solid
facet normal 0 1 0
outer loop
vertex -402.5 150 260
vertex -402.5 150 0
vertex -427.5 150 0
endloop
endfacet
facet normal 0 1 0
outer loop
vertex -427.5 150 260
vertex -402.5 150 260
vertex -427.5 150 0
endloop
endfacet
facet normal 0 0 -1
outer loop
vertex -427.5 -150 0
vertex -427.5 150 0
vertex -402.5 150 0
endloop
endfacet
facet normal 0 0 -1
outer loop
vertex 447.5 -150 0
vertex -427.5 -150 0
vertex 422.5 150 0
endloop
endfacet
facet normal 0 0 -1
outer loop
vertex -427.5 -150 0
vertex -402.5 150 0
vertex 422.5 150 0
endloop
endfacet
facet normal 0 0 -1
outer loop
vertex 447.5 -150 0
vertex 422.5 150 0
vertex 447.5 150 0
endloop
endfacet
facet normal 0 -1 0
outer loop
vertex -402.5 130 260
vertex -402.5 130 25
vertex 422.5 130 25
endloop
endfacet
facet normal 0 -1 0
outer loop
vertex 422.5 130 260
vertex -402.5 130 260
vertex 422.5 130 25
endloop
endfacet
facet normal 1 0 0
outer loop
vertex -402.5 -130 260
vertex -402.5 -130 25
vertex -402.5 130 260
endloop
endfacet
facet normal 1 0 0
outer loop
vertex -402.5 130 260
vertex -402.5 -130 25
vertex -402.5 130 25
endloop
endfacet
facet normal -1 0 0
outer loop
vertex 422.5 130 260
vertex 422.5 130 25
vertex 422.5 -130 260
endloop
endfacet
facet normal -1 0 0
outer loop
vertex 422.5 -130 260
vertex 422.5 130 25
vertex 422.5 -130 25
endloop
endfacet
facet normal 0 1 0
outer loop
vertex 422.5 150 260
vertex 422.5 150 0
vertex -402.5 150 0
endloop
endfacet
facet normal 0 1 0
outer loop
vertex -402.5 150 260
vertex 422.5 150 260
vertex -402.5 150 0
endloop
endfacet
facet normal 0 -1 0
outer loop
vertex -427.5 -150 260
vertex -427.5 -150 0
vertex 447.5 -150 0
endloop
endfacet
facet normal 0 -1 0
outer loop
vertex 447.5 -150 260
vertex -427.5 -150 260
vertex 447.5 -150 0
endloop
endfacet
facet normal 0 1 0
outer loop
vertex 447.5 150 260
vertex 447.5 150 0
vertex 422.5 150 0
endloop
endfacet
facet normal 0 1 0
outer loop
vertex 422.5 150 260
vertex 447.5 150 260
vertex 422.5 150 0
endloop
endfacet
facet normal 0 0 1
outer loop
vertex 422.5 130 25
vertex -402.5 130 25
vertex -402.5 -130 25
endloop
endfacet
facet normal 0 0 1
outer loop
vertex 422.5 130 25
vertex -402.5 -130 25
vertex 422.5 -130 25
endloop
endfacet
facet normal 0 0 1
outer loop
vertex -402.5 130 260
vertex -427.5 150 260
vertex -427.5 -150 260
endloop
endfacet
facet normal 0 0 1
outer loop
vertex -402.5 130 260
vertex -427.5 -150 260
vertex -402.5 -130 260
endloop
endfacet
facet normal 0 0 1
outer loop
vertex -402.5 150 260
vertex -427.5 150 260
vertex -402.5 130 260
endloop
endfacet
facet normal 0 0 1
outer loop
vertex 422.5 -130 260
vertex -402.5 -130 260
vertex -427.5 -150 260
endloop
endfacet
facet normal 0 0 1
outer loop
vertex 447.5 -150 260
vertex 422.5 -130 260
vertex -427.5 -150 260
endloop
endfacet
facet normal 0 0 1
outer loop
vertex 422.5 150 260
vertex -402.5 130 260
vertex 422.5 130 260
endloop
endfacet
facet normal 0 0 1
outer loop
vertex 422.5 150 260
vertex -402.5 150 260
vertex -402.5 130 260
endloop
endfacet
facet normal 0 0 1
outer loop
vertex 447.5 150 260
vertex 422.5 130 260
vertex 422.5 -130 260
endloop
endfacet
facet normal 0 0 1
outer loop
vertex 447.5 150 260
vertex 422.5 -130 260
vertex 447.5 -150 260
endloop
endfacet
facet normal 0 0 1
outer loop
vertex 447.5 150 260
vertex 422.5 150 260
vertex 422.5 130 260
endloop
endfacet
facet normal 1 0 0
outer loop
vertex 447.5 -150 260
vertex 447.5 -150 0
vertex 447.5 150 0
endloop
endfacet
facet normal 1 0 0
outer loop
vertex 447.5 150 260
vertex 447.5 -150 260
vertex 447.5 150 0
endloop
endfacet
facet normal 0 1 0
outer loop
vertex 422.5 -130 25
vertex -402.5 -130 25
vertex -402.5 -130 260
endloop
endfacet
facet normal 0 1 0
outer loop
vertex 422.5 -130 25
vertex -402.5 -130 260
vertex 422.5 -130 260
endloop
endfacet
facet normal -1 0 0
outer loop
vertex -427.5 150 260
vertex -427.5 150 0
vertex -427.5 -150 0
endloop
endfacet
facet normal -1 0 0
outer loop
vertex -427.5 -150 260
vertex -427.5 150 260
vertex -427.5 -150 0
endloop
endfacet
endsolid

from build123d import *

# Parameters (mm, degrees)
F0_W     = 825
F0_H     = 20
F1_DEPTH = 260
F0_H_2   = 260
F2_DEPTH = 25


# Not quite as in the source:
# - ends of sketch curves that miss each other by under 0.0002 mm in the source are joined
# - a feature names something its author has since deleted; it is built from what else it names


with BuildPart() as f1:
    # F0 (on Top) → F1 (new body)
    with BuildSketch(Plane.XY):
        Polygon((422.5, 130), (422.5, 149.9999940395), (-402.5, 150), (-402.5, 130), align=None)
        Polygon((422.5, -150), (447.5, -150), (447.5, 150), (422.5, 150), (422.5, 130), (422.5, -130), align=None)
        with Locations((10, -140)):
            Rectangle(F0_W, F0_H)
        Polygon((-427.5, -150), (-402.5, -150), (-402.5, -130), (-402.5, 130), (-402.5, 149.9999940395), (-427.5, 150), align=None)
    extrude(amount=F1_DEPTH)

    # F0 (on Top) → F2 (join)
    with BuildSketch(Plane.XY):
        with Locations((10, 0)):
            Rectangle(F0_W, F0_H_2)
    extrude(amount=F2_DEPTH)


solid = f1.part
